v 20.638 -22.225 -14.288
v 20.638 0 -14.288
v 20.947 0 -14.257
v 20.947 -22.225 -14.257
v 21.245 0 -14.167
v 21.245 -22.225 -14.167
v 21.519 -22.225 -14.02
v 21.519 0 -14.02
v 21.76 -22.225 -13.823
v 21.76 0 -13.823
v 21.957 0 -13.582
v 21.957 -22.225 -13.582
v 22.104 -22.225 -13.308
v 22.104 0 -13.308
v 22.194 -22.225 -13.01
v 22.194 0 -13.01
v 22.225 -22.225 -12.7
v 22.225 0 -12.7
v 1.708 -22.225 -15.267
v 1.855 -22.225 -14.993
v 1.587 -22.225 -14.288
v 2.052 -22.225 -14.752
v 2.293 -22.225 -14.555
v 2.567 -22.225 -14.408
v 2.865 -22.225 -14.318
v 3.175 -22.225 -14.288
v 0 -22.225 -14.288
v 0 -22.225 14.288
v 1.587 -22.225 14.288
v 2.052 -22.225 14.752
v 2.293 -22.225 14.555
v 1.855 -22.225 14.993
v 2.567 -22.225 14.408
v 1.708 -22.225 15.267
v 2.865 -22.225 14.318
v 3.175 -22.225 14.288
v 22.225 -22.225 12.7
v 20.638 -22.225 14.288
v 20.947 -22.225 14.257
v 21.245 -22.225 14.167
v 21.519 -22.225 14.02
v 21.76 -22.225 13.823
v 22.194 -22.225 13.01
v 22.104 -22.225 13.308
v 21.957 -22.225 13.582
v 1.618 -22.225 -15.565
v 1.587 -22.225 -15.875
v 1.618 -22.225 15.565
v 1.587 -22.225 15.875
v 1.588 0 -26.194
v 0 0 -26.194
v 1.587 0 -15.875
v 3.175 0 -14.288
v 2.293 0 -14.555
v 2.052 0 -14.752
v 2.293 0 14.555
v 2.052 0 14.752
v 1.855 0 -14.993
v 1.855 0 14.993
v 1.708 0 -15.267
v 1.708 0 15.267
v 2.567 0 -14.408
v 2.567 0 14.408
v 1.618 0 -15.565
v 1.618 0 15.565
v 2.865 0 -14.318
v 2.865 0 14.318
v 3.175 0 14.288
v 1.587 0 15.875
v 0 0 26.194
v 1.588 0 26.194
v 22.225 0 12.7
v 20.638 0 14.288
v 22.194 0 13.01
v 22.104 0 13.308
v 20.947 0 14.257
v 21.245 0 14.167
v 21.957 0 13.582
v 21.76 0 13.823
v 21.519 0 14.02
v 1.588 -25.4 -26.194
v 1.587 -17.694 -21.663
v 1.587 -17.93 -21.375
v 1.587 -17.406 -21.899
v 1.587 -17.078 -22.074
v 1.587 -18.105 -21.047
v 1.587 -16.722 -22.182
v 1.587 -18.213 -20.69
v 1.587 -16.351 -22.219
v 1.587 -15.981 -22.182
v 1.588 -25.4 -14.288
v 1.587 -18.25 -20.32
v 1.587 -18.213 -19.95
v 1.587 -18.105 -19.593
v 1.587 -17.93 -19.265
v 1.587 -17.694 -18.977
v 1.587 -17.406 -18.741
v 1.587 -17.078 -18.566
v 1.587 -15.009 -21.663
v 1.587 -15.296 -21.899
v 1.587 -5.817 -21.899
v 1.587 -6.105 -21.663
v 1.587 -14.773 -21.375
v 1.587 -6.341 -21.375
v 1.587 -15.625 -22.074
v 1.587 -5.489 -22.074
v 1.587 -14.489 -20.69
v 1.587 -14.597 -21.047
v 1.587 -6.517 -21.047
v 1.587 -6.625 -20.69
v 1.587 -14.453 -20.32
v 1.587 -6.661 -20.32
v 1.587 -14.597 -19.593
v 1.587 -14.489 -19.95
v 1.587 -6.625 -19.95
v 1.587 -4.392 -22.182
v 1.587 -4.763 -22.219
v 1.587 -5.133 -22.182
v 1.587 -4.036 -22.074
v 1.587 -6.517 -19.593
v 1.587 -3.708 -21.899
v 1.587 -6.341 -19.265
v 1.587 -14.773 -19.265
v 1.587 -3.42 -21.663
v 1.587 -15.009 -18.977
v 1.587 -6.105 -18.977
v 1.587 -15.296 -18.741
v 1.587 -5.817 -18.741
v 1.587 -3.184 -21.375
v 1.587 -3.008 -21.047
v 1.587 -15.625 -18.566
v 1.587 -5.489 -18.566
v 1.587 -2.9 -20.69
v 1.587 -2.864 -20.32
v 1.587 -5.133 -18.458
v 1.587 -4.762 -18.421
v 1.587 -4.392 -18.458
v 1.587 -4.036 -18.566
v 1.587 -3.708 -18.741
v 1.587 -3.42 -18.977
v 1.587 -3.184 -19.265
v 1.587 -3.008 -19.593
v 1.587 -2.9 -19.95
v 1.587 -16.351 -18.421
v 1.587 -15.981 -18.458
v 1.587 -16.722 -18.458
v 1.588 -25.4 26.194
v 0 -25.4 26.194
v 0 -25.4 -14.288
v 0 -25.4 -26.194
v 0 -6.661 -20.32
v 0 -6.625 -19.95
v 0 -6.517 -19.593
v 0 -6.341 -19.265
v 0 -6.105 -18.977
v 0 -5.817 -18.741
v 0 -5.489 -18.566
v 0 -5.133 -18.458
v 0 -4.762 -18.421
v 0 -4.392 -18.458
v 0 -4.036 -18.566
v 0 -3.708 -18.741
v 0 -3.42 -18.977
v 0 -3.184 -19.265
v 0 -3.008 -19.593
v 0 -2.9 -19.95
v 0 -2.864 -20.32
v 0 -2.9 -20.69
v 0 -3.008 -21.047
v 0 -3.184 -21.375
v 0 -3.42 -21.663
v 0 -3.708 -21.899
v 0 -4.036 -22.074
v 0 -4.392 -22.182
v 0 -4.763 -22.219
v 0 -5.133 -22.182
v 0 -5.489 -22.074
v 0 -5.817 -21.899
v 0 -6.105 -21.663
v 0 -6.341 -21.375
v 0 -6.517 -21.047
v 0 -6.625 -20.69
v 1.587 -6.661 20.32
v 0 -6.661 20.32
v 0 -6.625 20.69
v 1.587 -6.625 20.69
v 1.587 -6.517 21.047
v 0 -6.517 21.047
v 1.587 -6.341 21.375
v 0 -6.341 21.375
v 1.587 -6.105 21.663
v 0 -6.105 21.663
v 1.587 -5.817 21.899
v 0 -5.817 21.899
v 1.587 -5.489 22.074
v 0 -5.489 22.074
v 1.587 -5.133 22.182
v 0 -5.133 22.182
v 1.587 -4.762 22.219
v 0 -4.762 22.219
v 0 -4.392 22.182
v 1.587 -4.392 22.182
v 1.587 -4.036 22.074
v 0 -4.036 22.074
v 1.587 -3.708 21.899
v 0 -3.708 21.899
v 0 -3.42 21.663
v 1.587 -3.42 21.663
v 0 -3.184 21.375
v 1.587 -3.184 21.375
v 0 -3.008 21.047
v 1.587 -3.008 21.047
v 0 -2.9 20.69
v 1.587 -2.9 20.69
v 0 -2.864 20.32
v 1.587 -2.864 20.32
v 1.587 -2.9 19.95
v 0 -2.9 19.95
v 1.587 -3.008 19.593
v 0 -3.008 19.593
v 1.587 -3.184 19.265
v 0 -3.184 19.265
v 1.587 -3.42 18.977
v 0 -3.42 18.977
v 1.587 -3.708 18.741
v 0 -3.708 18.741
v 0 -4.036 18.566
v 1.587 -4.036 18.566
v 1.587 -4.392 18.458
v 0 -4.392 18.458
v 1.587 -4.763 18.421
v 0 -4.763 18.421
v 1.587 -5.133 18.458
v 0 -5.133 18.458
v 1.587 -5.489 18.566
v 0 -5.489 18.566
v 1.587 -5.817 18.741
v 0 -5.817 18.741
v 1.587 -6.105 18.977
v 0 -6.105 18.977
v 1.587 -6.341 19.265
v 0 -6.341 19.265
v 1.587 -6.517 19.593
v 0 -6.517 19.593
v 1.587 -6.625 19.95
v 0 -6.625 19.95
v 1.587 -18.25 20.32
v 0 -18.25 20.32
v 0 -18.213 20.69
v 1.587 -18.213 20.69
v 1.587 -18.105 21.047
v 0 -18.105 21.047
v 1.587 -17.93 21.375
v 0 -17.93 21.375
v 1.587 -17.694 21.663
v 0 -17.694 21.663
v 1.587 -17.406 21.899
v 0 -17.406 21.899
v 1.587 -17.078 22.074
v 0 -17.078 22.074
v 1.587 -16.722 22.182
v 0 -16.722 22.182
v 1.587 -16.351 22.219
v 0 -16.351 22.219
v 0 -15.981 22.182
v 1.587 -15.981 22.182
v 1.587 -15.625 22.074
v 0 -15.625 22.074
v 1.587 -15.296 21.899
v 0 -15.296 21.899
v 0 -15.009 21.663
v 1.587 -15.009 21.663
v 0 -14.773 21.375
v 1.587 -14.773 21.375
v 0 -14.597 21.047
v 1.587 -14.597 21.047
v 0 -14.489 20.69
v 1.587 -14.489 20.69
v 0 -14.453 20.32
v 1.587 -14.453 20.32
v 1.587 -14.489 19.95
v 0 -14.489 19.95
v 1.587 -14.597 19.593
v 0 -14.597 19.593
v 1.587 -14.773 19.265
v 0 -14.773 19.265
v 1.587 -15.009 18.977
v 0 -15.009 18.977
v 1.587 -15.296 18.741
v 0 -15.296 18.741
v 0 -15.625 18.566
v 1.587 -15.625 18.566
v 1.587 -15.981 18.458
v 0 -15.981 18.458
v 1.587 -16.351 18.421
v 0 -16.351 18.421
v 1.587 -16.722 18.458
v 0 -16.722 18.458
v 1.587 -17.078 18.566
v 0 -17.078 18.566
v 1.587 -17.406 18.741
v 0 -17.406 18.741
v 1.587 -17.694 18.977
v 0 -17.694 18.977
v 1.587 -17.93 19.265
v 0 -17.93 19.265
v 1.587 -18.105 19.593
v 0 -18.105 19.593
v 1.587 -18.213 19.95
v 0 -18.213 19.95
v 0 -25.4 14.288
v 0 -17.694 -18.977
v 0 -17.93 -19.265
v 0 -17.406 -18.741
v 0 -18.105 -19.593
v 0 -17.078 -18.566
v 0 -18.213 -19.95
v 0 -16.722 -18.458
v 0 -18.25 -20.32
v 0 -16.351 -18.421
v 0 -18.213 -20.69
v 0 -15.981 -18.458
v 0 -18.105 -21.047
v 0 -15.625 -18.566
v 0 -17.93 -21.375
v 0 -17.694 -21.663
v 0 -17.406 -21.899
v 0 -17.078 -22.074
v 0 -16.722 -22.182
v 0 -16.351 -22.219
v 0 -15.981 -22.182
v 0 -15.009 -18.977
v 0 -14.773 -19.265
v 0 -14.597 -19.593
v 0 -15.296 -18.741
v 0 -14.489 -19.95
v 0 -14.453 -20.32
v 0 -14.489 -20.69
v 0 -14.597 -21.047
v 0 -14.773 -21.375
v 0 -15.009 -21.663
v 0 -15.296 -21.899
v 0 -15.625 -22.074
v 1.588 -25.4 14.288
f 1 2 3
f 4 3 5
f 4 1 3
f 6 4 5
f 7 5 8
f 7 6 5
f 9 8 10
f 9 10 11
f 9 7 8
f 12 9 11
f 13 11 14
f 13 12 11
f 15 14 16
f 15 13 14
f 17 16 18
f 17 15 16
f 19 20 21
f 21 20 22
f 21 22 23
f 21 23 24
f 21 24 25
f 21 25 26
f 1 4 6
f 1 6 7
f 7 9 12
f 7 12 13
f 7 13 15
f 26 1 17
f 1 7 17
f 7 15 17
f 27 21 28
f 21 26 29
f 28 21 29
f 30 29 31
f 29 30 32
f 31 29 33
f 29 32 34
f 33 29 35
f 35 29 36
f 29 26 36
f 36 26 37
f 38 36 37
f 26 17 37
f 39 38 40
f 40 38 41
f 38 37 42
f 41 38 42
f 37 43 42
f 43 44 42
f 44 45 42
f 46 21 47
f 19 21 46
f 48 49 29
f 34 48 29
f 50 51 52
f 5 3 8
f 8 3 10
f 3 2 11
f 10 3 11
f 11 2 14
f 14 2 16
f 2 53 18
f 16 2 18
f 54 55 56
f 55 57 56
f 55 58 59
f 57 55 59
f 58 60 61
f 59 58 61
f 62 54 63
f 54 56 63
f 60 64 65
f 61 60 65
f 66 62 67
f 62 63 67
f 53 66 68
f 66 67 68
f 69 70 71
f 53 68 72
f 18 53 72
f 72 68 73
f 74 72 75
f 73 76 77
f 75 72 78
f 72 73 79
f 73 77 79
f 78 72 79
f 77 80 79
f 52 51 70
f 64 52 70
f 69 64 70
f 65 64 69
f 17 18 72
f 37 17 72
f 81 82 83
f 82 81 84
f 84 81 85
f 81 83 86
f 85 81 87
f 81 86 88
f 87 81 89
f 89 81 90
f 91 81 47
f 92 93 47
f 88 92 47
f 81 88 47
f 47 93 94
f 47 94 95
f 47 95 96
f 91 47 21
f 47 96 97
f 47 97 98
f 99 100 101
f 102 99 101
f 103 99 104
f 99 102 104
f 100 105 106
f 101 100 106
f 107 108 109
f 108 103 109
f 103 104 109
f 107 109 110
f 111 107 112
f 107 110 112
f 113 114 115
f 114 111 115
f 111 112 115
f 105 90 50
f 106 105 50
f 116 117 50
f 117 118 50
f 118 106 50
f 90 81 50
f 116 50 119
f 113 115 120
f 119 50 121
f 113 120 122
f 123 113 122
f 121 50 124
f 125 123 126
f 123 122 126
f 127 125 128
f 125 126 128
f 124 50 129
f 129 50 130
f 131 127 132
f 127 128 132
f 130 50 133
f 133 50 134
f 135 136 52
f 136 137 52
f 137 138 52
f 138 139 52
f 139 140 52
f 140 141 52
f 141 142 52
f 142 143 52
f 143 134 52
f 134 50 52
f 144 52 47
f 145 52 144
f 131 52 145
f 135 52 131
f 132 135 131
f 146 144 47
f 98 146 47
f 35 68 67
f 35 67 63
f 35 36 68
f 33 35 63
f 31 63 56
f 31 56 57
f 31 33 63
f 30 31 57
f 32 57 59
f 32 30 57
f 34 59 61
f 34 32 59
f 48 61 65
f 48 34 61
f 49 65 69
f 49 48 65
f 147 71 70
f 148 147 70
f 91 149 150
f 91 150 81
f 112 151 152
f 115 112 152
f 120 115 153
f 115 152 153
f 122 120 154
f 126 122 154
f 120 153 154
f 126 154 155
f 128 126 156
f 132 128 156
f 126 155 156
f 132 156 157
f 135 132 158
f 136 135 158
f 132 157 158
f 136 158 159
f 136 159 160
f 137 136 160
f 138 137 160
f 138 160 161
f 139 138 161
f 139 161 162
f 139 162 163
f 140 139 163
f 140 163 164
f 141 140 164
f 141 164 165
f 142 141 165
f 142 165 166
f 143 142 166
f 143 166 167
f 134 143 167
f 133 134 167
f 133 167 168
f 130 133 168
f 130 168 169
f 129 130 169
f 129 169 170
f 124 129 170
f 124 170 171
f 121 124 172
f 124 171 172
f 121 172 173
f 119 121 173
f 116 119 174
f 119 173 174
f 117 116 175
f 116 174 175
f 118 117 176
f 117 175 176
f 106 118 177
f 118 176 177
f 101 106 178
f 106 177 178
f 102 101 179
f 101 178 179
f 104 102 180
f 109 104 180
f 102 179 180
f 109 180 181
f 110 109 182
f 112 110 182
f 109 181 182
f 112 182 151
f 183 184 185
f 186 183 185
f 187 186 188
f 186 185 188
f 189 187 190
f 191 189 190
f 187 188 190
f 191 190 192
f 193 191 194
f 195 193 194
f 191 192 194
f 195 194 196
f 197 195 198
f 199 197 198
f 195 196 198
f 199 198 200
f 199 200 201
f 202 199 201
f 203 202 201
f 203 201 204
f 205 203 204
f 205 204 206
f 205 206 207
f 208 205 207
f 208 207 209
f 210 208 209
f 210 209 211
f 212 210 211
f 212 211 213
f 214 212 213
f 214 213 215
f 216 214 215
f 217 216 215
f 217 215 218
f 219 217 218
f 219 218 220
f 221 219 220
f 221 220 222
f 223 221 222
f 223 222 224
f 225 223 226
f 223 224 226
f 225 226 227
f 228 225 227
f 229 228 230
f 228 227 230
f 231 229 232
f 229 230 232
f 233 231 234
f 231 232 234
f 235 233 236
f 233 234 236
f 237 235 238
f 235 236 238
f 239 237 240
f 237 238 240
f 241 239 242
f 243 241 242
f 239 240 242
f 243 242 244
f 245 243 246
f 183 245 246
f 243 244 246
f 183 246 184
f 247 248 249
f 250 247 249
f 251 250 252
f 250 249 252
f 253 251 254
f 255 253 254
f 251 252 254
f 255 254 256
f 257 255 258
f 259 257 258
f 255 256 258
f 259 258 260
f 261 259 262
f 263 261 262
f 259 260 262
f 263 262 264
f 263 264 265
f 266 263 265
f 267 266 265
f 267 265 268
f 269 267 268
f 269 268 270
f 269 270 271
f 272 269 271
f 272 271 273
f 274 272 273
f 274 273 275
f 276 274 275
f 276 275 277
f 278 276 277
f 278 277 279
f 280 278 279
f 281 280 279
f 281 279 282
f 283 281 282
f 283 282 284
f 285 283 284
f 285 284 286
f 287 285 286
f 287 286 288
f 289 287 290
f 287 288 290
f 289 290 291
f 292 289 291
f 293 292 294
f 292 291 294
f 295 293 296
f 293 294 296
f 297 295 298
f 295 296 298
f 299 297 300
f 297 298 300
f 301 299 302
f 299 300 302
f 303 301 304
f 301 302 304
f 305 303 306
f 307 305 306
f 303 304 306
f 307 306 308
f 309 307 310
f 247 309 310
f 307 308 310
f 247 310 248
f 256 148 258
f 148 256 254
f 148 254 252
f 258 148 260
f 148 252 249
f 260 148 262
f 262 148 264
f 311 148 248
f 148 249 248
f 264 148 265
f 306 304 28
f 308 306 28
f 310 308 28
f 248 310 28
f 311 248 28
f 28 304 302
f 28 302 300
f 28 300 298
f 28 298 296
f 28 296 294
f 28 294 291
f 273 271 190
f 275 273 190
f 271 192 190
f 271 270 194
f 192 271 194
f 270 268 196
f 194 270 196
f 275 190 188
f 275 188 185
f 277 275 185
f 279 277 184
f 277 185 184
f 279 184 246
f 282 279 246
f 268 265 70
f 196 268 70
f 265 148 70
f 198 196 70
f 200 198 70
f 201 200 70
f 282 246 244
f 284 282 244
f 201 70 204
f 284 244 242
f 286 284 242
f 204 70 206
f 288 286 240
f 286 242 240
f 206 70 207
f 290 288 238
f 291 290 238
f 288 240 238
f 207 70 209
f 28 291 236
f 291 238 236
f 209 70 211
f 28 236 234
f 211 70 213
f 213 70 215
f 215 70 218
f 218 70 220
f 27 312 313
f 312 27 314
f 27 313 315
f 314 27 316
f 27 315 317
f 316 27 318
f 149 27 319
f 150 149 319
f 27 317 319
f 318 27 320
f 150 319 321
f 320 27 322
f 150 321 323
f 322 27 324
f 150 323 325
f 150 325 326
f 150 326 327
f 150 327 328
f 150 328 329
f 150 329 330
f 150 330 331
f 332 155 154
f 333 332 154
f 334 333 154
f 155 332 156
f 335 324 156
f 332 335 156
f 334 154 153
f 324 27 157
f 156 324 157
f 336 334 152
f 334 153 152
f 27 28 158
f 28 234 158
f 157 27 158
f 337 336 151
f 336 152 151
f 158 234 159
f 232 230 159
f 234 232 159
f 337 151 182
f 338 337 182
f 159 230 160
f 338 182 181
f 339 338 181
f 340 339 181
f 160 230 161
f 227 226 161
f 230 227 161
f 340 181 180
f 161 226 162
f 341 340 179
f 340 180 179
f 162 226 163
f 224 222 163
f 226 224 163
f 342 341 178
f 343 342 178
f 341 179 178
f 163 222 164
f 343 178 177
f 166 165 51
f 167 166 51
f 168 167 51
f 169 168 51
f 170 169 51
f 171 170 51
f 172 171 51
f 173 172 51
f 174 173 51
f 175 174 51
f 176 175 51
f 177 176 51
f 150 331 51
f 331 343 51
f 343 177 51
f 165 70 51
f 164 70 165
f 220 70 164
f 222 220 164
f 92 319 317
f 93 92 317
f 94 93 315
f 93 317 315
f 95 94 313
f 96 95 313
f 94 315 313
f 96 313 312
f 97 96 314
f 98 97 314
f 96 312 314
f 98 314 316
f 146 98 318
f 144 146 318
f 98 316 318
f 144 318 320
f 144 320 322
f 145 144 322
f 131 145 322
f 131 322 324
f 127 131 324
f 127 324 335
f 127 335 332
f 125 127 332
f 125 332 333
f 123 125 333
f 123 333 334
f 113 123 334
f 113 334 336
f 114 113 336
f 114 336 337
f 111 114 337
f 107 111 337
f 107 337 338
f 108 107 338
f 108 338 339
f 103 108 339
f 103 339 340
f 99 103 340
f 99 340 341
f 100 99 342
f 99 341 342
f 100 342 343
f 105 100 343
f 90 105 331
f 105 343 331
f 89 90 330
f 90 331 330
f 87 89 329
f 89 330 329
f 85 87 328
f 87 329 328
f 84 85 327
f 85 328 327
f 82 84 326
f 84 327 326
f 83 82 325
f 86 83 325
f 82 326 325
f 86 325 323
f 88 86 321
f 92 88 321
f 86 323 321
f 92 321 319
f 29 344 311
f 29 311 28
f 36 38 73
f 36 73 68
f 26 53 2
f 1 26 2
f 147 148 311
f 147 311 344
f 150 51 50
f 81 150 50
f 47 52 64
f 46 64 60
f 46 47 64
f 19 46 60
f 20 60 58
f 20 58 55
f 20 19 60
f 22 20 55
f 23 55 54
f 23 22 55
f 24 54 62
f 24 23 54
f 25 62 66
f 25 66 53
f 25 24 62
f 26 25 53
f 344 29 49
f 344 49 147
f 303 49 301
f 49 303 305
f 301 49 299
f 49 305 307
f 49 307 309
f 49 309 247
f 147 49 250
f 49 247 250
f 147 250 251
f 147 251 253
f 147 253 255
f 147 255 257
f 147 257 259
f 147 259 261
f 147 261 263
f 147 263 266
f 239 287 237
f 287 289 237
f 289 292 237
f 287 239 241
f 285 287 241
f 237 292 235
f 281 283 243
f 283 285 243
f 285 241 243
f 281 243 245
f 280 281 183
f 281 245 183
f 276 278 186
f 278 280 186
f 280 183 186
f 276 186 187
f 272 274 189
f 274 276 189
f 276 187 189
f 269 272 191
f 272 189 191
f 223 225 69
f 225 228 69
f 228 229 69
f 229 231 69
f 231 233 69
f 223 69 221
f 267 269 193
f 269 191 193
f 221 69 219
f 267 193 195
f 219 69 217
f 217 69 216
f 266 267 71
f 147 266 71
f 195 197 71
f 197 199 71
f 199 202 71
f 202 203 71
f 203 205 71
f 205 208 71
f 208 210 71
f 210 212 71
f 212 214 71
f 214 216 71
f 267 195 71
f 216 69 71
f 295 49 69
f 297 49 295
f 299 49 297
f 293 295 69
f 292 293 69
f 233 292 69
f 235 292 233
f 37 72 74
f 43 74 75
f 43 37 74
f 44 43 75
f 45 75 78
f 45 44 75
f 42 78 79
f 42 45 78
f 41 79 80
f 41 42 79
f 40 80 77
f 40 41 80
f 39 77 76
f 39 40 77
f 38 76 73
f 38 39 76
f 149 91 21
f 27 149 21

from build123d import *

# Parameters (mm, degrees)
F1_DEPTH = 25.4
F3_D     = 3.7973
F4_W     = 3.175
F4_H     = 28.575
F5_DEPTH = 22.226
F6_R     = 1.5875


with BuildPart() as f1:
    # F0 (on Front) → F1 (new body)
    with BuildSketch(Plane.XZ):
        Polygon((0, 26.19375), (0, 0), (0, -26.19375), (1.5875, -26.19375), (1.5875, -14.2875), (22.225, -14.2875), (22.225, 0), (22.225, 14.2875), (1.5875, 14.2875), (1.5875, 26.19375), align=None)
    extrude(amount=F1_DEPTH)

    # F3 (through all)
    with Locations(Plane.YZ.offset(1.5875)):
        with Locations((-16.35125, 20.32), (-4.7625, 20.32), (-16.35125, -20.32), (-4.7625, -20.32)):
            Hole(F3_D / 2)

    # F4 (on face) → F5 (cut, through all)
    with BuildSketch(Plane.YZ.offset(22.225)):
        with Locations((-23.8125, 0)):
            Rectangle(F4_W, F4_H)
    extrude(amount=-F5_DEPTH, mode=Mode.SUBTRACT)

    # F6
    f6_edges = [f1.edges().sort_by_distance(p)[0] for p in [
        (22.225, -11.1125, 14.2875),
        (22.225, -11.1125, -14.2875),
        (1.5875, -11.1125, 14.2875),
        (1.5875, -11.1125, -14.2875),
    ]]
    fillet(f6_edges, radius=F6_R)


solid = f1.part
